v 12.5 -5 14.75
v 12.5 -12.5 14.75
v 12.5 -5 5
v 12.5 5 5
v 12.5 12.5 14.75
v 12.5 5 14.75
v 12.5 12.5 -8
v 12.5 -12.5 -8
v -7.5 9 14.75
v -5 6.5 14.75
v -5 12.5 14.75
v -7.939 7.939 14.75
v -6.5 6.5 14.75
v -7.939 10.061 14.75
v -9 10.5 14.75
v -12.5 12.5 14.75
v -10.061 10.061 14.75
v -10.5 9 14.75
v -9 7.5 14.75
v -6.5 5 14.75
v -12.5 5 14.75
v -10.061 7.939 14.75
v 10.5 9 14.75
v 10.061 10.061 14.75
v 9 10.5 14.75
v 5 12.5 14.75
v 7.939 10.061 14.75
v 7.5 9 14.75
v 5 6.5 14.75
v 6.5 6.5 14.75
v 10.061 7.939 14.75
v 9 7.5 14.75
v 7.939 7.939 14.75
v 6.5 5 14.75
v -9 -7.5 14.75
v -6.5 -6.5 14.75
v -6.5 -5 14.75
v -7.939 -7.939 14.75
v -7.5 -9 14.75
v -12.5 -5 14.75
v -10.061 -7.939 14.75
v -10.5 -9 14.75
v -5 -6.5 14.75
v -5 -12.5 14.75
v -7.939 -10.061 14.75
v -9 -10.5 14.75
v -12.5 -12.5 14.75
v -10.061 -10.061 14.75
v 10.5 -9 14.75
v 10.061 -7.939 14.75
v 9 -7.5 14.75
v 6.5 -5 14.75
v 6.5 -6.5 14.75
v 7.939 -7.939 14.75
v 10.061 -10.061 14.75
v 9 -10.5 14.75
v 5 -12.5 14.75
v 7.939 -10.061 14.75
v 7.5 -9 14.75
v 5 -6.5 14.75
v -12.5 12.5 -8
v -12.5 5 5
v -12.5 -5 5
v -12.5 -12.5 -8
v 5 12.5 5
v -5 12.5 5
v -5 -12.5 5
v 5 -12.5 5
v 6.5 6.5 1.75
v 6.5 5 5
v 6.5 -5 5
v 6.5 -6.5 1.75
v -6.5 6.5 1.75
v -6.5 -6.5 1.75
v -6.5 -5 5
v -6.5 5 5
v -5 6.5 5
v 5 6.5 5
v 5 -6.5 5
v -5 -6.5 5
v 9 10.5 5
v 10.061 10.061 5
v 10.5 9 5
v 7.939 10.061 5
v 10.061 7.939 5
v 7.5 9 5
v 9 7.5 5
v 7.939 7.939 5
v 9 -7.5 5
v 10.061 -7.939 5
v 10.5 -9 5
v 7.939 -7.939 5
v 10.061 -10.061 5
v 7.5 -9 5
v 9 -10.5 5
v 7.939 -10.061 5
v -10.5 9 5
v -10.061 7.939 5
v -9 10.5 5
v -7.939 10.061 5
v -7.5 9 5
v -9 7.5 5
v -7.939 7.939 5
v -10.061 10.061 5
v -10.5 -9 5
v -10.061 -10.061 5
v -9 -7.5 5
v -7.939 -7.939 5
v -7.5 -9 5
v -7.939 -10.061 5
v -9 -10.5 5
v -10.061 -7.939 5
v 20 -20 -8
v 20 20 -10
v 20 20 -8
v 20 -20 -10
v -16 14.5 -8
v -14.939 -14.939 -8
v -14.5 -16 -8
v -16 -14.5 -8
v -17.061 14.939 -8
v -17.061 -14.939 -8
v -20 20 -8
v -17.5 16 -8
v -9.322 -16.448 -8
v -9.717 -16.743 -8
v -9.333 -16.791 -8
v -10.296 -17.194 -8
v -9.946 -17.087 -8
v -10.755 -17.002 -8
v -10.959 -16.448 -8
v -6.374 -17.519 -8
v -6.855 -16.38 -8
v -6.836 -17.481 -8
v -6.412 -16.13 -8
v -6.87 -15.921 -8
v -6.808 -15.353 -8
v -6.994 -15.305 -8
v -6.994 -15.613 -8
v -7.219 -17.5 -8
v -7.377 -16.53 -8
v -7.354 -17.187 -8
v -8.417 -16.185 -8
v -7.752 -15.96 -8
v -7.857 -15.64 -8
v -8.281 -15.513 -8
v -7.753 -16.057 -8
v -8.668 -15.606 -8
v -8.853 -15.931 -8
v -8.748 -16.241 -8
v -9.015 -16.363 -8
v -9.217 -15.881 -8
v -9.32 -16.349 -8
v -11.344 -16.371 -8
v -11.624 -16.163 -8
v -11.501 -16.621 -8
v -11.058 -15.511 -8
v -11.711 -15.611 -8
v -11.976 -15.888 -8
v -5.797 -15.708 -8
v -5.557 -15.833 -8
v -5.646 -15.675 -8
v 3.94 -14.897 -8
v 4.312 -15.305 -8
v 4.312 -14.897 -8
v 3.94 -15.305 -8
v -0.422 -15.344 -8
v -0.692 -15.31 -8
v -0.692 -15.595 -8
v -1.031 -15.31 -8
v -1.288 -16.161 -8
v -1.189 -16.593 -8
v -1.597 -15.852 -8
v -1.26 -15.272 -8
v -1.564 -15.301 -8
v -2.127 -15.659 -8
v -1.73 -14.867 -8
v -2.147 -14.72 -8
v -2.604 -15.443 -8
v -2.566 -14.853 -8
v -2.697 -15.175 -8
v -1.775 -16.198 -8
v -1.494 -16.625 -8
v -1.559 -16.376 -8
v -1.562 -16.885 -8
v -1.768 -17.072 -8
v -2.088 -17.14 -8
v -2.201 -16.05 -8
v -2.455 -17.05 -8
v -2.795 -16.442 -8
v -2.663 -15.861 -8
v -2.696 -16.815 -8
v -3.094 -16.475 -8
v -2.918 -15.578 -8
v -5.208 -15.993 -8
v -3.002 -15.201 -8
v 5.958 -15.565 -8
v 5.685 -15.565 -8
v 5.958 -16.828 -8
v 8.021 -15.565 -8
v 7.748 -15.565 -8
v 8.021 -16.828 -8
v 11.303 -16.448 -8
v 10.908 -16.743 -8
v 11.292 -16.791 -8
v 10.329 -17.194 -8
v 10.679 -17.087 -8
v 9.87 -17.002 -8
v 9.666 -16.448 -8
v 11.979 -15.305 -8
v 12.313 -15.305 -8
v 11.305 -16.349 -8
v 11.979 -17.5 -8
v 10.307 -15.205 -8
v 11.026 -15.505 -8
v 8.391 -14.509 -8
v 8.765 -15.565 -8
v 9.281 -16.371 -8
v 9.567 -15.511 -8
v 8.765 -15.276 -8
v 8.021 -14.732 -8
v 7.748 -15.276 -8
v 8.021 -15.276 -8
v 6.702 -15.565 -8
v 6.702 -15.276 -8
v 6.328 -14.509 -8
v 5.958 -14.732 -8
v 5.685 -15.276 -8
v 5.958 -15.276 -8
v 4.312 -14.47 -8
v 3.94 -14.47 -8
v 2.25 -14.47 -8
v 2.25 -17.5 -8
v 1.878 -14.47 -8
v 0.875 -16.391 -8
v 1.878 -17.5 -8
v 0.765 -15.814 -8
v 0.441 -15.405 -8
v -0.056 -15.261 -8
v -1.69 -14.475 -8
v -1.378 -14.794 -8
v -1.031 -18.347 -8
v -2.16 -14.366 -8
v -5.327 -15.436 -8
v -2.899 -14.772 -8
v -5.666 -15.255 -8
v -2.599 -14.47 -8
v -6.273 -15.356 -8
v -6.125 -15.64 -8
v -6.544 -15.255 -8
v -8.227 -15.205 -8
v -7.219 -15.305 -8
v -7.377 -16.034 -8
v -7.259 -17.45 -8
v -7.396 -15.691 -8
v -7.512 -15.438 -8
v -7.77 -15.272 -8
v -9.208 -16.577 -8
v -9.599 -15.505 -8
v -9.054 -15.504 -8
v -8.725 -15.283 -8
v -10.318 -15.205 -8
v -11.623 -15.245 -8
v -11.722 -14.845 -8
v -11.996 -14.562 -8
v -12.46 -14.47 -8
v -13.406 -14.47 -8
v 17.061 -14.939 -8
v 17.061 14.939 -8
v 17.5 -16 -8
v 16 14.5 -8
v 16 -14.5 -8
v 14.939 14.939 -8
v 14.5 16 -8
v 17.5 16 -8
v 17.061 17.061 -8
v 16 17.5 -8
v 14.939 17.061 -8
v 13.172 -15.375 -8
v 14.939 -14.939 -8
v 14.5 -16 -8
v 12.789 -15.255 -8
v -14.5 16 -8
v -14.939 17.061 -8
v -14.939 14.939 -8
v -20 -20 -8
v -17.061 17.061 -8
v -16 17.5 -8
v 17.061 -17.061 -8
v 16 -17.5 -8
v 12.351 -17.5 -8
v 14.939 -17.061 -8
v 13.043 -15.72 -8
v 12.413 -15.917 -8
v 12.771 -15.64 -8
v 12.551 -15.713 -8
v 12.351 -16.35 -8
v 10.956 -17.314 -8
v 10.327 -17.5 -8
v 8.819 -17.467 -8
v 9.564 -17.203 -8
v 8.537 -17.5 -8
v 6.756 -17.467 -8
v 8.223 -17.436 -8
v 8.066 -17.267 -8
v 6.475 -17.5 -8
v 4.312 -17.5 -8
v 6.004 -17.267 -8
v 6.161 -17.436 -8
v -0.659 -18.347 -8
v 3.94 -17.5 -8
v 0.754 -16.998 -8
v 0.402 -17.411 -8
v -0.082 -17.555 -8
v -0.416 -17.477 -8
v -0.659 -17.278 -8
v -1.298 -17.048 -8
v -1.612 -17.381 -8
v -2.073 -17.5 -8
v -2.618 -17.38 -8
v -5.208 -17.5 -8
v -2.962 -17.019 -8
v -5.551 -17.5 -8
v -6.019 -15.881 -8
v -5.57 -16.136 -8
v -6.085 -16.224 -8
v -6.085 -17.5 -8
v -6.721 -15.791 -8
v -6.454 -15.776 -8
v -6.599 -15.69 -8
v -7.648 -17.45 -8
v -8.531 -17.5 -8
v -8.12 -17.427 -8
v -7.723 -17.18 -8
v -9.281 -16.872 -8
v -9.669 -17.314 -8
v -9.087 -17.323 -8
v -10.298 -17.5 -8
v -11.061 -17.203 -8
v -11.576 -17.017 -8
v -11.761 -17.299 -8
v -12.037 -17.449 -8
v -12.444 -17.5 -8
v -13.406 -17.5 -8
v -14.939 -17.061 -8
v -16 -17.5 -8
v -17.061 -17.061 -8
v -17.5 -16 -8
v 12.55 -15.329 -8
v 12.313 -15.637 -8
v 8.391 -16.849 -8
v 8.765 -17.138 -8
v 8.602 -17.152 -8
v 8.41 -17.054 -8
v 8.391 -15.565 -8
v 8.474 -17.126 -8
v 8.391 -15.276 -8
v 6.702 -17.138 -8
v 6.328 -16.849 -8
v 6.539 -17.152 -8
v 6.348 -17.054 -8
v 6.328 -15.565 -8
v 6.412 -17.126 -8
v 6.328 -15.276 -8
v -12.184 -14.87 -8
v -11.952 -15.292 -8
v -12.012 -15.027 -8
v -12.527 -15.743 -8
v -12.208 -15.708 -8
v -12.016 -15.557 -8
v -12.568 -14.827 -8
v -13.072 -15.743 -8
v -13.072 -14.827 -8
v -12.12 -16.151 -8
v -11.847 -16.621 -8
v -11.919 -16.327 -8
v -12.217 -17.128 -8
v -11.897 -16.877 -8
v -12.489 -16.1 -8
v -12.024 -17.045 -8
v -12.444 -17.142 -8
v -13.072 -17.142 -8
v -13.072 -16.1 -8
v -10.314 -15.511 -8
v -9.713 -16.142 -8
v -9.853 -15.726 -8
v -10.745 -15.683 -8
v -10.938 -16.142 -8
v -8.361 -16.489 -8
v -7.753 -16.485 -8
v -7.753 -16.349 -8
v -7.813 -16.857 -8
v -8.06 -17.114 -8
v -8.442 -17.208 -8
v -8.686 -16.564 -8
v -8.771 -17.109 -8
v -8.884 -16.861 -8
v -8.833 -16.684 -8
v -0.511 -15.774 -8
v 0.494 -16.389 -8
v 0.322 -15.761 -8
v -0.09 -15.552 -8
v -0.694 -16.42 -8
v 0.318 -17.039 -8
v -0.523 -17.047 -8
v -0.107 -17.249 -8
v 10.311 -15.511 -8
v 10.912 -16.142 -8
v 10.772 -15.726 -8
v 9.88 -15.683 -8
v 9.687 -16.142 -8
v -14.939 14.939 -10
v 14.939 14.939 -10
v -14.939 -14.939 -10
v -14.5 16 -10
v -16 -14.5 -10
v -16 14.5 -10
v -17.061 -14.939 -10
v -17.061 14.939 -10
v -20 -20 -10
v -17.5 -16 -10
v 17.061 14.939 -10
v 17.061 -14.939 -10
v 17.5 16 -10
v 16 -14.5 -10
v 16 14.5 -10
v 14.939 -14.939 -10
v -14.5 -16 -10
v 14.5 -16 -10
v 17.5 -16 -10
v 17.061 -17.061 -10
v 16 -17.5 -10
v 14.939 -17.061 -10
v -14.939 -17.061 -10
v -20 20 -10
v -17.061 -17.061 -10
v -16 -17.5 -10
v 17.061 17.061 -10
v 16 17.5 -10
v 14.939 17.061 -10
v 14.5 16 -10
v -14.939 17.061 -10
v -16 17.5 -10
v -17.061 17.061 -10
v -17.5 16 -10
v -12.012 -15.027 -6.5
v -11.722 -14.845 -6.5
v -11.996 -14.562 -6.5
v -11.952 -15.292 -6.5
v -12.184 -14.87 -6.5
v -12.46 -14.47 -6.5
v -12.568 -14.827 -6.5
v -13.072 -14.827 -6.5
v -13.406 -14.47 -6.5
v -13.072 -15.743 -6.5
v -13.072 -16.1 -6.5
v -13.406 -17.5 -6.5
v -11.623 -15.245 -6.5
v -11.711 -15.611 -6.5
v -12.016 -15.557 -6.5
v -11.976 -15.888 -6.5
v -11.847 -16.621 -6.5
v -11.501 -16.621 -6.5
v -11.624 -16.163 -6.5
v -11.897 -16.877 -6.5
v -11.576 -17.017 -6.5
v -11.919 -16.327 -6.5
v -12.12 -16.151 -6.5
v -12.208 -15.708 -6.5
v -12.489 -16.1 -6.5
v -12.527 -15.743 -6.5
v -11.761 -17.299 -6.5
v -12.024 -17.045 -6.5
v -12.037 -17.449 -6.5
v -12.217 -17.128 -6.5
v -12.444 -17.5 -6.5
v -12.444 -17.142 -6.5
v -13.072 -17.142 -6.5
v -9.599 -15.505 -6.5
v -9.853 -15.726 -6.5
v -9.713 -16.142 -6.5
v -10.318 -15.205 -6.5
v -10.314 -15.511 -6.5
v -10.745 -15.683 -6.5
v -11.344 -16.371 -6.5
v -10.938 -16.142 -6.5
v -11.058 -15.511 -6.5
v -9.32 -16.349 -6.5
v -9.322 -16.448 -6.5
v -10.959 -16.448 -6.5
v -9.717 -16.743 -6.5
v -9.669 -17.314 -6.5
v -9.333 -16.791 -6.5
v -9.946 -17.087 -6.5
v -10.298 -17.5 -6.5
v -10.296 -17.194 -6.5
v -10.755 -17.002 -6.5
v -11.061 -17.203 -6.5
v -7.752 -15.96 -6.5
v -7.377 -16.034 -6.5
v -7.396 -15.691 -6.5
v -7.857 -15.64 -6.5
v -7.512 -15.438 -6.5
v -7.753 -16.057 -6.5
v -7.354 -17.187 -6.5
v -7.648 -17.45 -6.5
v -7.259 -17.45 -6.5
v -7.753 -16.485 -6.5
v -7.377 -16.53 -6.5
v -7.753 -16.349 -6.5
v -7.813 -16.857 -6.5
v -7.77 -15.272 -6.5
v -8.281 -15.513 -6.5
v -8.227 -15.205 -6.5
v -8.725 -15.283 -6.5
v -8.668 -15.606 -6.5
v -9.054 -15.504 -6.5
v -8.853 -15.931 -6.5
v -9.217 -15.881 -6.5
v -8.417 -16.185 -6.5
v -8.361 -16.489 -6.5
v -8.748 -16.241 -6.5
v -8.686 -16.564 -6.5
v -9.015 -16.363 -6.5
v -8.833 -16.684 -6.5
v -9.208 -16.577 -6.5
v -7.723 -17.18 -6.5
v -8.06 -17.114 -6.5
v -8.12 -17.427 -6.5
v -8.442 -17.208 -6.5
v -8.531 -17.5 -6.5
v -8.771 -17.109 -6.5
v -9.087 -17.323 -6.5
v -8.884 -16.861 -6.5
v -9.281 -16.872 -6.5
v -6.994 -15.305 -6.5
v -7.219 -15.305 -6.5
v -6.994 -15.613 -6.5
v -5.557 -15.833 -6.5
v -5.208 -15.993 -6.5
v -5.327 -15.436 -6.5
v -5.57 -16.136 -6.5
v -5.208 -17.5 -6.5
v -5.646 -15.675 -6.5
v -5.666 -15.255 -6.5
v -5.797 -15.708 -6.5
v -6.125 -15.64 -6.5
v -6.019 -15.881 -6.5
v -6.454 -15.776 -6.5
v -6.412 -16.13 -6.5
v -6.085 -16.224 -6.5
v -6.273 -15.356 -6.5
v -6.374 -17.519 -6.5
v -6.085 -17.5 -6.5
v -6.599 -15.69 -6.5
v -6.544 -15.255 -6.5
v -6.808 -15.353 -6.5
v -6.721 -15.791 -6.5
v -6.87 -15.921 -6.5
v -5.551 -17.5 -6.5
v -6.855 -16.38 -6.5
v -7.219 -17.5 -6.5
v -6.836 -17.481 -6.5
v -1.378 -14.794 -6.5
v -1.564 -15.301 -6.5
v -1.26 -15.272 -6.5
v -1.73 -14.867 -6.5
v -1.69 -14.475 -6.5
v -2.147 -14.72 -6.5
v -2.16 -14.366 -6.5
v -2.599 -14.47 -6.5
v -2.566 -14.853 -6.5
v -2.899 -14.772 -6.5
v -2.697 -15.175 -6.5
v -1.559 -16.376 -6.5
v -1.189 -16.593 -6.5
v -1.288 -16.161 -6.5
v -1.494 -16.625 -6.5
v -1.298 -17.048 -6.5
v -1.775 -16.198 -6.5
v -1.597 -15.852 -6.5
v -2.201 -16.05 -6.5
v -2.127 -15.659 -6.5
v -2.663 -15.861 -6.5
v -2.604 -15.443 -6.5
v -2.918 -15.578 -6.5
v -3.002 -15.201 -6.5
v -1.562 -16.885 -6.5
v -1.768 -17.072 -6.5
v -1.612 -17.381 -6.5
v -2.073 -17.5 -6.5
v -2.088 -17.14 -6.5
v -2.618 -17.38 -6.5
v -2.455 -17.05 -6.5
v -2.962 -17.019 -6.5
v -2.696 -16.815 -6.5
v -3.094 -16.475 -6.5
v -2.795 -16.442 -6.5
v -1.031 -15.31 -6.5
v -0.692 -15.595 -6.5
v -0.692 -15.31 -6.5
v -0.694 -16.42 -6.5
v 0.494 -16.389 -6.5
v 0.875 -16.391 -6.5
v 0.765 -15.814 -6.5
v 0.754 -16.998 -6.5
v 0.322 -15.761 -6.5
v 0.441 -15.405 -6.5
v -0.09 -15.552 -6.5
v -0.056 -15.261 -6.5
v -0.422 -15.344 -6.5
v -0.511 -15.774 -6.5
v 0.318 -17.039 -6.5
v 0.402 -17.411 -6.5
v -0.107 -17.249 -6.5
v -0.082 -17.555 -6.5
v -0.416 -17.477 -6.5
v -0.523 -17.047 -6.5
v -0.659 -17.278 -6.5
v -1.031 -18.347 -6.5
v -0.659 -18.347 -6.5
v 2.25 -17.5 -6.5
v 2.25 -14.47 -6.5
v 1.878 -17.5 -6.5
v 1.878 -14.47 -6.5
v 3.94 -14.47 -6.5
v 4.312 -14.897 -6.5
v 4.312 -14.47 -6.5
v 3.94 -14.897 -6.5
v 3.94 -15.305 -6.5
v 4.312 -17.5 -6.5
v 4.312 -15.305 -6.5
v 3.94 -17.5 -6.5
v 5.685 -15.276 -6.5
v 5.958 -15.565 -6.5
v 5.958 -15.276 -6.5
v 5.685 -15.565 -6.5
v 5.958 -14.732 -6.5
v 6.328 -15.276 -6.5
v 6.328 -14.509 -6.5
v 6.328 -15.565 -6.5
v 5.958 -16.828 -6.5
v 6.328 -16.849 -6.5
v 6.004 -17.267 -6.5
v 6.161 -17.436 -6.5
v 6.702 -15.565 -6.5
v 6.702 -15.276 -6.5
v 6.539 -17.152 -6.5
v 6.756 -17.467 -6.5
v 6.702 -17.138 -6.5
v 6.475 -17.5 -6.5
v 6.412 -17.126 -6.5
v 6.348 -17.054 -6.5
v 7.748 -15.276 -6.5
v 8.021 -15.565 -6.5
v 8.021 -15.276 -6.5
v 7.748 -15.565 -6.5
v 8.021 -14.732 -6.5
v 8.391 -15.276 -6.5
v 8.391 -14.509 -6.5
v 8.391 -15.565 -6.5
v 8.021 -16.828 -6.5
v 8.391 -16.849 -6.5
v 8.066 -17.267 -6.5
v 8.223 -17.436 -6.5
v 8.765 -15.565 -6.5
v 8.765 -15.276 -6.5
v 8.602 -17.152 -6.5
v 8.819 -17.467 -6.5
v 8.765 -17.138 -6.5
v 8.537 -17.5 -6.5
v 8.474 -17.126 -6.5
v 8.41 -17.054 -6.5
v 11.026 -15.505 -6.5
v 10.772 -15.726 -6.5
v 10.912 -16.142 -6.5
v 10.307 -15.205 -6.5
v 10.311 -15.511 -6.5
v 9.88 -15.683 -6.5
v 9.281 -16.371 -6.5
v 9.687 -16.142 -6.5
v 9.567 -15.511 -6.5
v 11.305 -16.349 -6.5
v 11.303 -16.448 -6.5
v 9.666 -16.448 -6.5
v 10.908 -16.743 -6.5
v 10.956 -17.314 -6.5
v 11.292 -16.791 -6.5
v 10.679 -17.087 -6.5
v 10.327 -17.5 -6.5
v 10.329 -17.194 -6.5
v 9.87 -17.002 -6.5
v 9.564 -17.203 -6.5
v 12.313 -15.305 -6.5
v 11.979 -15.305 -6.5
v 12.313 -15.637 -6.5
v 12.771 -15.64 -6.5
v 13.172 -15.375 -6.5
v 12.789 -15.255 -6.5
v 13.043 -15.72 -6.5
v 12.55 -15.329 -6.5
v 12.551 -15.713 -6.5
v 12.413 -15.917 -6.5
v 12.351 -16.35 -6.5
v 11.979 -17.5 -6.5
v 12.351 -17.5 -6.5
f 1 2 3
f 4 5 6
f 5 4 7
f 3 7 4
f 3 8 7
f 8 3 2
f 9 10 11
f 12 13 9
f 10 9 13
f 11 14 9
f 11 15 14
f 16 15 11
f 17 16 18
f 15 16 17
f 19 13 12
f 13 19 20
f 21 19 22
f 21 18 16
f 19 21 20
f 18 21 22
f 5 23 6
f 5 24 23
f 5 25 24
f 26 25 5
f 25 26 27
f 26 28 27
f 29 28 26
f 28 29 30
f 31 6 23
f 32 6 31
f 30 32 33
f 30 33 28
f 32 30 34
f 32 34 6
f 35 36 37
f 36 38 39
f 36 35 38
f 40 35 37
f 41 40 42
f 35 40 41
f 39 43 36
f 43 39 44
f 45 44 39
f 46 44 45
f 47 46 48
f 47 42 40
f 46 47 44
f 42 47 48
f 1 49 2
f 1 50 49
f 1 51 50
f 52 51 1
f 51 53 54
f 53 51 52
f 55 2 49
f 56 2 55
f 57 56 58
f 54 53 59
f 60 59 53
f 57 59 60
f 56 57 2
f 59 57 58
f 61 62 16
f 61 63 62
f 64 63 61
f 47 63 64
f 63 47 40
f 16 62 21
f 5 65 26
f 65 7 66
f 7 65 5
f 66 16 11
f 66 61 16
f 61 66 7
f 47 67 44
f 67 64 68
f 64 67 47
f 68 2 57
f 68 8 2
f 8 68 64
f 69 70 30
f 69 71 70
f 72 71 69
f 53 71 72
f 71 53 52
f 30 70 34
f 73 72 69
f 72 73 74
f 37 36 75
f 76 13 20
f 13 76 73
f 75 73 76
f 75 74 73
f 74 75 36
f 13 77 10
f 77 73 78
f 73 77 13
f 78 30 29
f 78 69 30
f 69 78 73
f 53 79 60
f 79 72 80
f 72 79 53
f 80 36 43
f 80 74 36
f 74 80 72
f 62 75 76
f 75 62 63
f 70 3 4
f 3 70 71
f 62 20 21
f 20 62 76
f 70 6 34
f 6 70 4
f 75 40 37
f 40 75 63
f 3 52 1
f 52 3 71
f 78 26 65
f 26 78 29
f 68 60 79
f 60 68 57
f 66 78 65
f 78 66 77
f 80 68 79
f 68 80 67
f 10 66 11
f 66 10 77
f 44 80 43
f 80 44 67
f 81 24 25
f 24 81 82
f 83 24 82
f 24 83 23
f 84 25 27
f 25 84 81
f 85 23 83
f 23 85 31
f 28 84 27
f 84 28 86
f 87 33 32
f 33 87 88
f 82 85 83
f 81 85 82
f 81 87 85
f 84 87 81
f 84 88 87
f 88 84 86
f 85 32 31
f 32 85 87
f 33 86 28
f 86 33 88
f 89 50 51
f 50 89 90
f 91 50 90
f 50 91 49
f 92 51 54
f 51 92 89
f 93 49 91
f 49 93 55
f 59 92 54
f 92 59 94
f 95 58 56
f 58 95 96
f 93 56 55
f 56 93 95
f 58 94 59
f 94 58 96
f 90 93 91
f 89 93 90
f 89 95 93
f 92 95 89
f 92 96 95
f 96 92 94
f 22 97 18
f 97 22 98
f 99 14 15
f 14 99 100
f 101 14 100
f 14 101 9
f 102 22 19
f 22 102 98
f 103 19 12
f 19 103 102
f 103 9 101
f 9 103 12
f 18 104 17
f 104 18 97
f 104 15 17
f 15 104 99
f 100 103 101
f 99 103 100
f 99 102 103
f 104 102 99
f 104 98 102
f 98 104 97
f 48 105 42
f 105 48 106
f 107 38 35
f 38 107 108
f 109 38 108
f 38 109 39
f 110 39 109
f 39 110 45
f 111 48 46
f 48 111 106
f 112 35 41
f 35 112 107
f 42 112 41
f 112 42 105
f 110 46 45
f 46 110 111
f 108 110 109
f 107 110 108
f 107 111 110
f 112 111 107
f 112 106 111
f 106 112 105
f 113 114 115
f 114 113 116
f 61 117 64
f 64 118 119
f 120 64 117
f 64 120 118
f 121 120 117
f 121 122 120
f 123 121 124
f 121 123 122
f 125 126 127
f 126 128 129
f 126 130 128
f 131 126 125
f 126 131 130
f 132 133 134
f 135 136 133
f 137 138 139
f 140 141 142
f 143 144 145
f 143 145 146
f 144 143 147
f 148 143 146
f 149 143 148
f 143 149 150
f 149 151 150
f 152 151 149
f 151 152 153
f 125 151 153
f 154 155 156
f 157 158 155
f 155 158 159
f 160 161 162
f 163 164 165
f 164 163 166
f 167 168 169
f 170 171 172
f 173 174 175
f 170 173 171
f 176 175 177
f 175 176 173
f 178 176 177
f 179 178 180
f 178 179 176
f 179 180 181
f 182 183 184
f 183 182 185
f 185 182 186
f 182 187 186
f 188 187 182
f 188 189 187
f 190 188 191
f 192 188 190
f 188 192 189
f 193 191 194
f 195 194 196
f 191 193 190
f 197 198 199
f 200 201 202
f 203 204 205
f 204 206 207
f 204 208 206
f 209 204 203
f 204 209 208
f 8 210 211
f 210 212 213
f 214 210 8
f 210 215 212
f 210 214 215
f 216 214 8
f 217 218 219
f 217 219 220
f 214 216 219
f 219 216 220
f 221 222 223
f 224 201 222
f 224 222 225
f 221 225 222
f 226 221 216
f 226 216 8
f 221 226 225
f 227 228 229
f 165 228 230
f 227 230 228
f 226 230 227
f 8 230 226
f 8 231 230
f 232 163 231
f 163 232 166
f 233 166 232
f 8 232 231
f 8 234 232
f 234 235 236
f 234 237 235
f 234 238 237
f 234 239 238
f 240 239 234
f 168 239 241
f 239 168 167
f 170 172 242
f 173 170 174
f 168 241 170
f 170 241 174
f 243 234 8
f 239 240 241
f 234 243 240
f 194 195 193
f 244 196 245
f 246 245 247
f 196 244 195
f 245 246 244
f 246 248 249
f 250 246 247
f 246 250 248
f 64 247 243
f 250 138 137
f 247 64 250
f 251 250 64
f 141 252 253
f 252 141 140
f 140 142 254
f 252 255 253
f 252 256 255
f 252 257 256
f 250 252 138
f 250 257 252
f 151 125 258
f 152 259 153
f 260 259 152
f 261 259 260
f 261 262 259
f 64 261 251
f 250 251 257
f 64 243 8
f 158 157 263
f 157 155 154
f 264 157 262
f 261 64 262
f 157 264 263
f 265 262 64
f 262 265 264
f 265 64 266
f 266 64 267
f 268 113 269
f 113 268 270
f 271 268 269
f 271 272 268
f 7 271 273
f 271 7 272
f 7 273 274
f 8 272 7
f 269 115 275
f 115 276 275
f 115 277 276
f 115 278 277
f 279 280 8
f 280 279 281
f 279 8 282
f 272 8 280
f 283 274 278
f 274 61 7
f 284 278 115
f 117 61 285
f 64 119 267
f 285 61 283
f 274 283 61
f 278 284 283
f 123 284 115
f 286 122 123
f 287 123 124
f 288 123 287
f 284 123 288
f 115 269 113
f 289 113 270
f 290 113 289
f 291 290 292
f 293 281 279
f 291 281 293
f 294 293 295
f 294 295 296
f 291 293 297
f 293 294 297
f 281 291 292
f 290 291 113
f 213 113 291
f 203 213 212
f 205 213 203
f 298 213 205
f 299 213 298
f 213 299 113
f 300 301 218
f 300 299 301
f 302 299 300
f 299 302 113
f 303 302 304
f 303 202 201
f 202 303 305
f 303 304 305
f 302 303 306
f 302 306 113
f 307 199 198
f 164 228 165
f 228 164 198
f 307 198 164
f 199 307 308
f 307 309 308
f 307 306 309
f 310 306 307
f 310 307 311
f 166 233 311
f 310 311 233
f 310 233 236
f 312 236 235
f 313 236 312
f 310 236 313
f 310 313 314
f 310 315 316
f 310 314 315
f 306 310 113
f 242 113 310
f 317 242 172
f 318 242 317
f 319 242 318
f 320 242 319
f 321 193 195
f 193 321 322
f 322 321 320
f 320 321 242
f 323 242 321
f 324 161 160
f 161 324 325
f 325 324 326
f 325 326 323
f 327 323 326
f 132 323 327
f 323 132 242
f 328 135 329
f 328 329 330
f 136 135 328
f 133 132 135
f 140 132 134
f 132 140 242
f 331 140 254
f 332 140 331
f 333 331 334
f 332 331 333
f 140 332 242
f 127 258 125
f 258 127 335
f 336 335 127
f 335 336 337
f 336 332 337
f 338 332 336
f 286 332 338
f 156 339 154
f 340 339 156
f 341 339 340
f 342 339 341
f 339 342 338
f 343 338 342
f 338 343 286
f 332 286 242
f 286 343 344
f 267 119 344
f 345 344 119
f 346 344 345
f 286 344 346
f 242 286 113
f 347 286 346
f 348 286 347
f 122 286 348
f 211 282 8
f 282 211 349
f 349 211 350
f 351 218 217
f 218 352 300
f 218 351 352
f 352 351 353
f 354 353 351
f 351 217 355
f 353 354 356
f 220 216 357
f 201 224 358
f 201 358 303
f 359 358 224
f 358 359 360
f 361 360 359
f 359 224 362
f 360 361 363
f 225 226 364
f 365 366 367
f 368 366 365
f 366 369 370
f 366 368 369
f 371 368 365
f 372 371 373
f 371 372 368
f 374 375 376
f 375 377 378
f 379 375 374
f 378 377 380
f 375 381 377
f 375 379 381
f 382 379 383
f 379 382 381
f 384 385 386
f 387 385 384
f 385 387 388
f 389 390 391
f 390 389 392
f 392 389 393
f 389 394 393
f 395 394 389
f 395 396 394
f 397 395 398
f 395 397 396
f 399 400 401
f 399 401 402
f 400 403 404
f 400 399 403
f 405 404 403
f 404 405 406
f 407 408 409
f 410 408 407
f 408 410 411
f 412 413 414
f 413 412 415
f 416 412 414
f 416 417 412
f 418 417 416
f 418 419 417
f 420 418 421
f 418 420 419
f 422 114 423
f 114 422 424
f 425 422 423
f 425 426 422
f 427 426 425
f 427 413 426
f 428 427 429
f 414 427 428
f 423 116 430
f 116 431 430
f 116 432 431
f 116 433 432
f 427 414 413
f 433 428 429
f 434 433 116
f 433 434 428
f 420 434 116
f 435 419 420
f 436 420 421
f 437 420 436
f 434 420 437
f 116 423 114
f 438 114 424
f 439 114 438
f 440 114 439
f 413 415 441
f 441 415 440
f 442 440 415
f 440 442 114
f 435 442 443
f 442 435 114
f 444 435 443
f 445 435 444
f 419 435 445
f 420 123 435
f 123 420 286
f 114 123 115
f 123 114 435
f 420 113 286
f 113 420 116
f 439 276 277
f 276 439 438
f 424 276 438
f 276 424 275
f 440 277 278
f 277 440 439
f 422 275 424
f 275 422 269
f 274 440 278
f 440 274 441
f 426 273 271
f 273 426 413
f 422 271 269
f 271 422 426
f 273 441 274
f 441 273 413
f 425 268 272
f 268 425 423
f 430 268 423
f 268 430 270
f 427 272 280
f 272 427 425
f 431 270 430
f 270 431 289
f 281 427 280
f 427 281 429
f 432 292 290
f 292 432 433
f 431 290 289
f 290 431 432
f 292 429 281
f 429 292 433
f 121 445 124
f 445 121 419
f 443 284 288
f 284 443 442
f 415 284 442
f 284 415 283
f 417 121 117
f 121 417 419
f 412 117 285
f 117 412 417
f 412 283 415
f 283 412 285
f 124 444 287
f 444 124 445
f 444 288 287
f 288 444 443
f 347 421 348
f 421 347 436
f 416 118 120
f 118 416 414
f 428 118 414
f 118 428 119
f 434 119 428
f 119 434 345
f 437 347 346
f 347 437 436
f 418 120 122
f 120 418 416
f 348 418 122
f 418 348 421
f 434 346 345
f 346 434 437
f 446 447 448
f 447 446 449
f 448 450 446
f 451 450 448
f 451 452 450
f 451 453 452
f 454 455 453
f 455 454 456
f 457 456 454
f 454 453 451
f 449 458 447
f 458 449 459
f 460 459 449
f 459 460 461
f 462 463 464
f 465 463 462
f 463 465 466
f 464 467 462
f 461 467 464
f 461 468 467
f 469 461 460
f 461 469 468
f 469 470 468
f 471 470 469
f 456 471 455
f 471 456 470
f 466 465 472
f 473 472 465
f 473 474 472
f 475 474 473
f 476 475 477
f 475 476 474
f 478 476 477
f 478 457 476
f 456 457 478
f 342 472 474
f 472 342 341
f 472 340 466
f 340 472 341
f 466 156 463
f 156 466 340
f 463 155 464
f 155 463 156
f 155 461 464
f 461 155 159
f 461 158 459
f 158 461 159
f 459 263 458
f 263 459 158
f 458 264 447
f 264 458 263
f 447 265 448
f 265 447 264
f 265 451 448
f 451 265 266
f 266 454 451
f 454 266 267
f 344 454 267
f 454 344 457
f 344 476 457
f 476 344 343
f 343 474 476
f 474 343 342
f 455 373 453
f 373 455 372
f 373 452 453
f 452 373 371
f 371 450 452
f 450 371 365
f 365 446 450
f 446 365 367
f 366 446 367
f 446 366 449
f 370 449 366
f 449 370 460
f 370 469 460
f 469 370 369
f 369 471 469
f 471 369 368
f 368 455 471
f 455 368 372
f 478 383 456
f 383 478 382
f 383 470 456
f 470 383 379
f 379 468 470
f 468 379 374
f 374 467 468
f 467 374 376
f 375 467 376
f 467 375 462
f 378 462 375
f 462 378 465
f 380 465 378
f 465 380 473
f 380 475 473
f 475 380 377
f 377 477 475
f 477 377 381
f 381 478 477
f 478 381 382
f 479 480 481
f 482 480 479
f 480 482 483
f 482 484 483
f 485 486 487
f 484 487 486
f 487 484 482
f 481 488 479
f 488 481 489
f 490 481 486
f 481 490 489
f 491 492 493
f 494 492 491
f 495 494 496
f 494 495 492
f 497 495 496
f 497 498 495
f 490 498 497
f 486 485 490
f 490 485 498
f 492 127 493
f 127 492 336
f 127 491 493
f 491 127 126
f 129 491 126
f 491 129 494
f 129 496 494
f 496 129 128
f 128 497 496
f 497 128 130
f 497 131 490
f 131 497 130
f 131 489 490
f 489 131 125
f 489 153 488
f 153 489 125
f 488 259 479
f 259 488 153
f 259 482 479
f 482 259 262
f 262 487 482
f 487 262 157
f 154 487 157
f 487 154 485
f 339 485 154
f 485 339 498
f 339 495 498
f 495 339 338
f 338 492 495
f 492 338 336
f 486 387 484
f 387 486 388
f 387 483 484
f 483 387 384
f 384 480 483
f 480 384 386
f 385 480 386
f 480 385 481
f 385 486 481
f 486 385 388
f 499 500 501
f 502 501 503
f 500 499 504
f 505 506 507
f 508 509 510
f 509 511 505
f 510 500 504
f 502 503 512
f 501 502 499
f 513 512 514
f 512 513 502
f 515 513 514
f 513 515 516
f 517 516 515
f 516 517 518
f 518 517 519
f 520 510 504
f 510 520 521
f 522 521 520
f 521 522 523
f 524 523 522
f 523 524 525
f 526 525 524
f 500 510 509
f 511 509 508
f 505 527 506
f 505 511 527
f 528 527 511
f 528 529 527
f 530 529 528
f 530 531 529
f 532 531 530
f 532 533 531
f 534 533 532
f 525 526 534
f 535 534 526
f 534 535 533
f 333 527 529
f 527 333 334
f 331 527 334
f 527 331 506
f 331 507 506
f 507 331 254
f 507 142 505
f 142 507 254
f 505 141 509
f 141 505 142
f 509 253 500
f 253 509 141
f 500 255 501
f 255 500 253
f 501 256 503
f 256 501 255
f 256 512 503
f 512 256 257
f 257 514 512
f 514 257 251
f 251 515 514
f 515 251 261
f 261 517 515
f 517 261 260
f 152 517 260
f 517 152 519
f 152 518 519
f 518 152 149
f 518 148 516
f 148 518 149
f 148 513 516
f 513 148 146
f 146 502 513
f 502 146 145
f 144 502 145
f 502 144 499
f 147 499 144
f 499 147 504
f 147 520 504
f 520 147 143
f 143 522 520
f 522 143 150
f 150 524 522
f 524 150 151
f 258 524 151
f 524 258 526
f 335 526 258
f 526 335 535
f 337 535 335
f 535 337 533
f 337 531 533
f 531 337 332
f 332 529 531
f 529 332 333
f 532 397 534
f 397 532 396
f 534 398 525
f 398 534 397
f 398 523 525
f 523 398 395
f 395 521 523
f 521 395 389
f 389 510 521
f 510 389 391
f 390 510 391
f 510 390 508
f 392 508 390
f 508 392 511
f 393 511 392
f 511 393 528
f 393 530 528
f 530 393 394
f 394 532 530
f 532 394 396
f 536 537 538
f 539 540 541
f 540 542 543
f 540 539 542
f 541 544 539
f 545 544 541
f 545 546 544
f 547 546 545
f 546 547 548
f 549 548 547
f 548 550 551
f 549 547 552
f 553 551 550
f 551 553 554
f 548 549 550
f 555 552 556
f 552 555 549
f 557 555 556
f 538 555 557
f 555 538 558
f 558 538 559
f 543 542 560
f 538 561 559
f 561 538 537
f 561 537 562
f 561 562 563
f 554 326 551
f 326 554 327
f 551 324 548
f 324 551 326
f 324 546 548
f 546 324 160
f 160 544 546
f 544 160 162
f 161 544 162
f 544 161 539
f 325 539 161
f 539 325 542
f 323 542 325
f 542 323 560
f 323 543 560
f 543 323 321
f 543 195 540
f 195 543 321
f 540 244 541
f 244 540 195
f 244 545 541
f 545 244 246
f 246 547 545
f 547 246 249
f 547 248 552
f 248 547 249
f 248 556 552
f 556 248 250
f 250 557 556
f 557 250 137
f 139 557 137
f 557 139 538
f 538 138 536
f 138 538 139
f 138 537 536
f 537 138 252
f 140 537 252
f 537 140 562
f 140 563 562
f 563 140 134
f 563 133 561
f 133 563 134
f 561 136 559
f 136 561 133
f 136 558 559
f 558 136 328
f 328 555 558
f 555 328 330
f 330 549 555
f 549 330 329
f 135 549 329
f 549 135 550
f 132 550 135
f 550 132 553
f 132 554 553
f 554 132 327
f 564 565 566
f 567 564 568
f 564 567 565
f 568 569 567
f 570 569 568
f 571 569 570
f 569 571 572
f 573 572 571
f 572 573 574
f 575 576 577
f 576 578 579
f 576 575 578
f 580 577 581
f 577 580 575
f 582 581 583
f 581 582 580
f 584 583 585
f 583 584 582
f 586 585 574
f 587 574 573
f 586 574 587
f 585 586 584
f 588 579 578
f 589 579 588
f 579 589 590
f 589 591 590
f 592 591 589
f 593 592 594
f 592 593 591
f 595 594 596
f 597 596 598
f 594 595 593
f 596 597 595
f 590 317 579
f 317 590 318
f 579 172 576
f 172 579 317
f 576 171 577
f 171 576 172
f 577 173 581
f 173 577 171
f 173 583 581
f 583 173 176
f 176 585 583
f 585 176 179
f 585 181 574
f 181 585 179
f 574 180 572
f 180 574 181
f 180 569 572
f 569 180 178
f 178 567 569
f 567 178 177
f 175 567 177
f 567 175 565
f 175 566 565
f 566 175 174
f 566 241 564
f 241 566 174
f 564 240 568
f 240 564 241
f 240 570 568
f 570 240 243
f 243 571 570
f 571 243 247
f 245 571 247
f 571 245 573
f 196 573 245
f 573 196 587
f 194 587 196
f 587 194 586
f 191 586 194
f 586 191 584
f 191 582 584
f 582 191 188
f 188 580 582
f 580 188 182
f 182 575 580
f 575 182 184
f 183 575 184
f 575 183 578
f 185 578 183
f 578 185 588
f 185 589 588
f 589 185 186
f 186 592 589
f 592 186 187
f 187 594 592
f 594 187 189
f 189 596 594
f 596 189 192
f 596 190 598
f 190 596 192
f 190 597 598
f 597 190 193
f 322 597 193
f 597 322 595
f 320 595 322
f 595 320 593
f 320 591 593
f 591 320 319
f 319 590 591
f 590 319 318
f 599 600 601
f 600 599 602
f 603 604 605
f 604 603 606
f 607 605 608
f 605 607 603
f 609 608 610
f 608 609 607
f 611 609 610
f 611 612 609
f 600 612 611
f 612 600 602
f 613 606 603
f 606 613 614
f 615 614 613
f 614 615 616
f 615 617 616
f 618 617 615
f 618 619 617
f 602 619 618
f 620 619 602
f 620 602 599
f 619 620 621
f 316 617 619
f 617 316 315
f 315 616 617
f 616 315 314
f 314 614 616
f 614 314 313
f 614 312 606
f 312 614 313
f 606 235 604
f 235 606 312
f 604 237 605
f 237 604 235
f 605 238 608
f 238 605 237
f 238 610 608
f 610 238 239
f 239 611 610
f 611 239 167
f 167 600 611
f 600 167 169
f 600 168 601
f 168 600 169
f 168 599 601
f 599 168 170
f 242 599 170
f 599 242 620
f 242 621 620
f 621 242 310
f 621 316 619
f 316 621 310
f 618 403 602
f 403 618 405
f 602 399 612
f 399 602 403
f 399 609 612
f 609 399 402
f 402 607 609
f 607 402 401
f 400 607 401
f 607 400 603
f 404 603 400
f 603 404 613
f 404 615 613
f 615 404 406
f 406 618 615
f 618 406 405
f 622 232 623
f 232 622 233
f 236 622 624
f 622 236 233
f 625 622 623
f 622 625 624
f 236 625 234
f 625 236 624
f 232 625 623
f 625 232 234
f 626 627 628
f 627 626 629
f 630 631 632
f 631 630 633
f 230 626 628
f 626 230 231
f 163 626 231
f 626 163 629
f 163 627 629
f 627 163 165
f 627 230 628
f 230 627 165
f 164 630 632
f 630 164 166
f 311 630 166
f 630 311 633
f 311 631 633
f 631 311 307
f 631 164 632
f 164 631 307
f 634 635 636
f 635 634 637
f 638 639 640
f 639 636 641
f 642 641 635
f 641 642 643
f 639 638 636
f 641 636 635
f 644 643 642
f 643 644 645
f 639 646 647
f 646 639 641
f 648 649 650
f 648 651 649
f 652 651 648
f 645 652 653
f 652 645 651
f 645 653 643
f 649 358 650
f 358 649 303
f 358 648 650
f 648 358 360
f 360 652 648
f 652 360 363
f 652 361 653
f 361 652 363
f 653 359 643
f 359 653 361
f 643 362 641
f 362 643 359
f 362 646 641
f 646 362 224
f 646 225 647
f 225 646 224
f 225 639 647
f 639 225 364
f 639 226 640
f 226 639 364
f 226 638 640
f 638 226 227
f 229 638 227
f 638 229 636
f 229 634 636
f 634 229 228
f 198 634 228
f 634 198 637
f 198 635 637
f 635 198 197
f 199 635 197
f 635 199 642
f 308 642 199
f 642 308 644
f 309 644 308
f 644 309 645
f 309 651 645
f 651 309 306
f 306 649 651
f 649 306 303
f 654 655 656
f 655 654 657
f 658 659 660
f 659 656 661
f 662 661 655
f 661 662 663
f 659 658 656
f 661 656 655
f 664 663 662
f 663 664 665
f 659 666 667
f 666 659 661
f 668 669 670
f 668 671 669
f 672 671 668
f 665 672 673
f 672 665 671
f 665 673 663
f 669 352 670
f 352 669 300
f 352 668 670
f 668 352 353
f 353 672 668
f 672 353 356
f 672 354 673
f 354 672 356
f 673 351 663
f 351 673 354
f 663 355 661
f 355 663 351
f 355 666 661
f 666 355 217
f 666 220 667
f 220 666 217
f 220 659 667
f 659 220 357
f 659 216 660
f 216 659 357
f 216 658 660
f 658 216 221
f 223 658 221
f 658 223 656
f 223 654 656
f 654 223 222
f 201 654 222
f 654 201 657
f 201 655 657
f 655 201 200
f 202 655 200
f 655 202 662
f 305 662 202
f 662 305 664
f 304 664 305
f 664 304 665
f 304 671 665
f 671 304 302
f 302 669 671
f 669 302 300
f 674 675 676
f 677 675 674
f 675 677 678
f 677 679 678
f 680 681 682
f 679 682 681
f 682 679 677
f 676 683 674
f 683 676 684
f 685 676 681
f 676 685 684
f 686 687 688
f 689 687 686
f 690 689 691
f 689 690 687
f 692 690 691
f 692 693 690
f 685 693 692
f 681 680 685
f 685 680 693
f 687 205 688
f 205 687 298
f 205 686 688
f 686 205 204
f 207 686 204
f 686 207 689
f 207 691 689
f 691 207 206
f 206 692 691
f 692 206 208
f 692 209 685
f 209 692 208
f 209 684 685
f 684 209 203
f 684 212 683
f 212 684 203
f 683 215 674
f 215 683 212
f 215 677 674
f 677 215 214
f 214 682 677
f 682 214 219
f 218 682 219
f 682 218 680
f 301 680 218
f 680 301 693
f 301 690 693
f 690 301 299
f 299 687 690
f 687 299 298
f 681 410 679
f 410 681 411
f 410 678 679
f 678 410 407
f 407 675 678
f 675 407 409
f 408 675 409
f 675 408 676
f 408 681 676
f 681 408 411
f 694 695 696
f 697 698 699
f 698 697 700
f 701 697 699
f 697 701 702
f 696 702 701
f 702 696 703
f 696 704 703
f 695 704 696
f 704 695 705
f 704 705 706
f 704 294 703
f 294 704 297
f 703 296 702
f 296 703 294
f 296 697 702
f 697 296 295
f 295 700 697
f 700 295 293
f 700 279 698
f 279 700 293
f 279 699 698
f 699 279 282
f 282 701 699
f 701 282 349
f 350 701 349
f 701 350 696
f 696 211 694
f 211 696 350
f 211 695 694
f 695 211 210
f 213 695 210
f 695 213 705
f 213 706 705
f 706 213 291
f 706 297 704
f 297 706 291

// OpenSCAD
use <write.scad>

module beamSplitterMountBottom(){
	difference(){
		//mainBody
		translate([0,0,3.25]) color([.95,.95,.95]) cube(size=[25,25,23],center=true);
		//centerCube
		translate([0,0,8.25]) color([.25,.95,.95]) cube(size=[13,13,13],center=true);
		//laserPath
		translate([0,0,10]) color([0,.95,0]) cube(size=[30,10,10],center=true);
		translate([0,0,10]) color([.1,.15,.95]) cube(size=[10,30,10],center=true);
		//topScrewholes
		translate([9,9,10]) color([1,0,0]) cylinder(h=10,r=1.5,$fn=8,center=true);
		translate([9,-9,10]) color([1,0,0]) cylinder(h=10,r=1.5,$fn=8,center=true);
		translate([-9,9,10]) color([1,0,0]) cylinder(h=10,r=1.5,$fn=8,center=true);
		translate([-9,-9,10]) color([1,0,0]) cylinder(h=10,r=1.5,$fn=8,center=true);
	}
	difference(){
		//base
		translate([0,0,-9]) color([.95,.95,.95]) cube(size=[40,40,2],center=true);
		//baseScrewholes
		translate([16,16,-9]) color([1,0,0]) cylinder(h=5,r=1.5,$fn=8,center=true);
		translate([16,-16,-9]) color([1,0,0]) cylinder(h=5,r=1.5,$fn=8,center=true);
		translate([-16,16,-9]) color([1,0,0]) cylinder(h=5,r=1.5,$fn=8,center=true);
		translate([-16,-16,-9]) color([1,0,0]) cylinder(h=5,r=1.5,$fn=8,center=true);
	}
	rotate([0,0,0]){
		translate([0,-16,-8]){
			write("Beam Splitter",h=3,t=3,center=true);
		}
	}
}

translate([0,0,0]){
	beamSplitterMountBottom();
}
